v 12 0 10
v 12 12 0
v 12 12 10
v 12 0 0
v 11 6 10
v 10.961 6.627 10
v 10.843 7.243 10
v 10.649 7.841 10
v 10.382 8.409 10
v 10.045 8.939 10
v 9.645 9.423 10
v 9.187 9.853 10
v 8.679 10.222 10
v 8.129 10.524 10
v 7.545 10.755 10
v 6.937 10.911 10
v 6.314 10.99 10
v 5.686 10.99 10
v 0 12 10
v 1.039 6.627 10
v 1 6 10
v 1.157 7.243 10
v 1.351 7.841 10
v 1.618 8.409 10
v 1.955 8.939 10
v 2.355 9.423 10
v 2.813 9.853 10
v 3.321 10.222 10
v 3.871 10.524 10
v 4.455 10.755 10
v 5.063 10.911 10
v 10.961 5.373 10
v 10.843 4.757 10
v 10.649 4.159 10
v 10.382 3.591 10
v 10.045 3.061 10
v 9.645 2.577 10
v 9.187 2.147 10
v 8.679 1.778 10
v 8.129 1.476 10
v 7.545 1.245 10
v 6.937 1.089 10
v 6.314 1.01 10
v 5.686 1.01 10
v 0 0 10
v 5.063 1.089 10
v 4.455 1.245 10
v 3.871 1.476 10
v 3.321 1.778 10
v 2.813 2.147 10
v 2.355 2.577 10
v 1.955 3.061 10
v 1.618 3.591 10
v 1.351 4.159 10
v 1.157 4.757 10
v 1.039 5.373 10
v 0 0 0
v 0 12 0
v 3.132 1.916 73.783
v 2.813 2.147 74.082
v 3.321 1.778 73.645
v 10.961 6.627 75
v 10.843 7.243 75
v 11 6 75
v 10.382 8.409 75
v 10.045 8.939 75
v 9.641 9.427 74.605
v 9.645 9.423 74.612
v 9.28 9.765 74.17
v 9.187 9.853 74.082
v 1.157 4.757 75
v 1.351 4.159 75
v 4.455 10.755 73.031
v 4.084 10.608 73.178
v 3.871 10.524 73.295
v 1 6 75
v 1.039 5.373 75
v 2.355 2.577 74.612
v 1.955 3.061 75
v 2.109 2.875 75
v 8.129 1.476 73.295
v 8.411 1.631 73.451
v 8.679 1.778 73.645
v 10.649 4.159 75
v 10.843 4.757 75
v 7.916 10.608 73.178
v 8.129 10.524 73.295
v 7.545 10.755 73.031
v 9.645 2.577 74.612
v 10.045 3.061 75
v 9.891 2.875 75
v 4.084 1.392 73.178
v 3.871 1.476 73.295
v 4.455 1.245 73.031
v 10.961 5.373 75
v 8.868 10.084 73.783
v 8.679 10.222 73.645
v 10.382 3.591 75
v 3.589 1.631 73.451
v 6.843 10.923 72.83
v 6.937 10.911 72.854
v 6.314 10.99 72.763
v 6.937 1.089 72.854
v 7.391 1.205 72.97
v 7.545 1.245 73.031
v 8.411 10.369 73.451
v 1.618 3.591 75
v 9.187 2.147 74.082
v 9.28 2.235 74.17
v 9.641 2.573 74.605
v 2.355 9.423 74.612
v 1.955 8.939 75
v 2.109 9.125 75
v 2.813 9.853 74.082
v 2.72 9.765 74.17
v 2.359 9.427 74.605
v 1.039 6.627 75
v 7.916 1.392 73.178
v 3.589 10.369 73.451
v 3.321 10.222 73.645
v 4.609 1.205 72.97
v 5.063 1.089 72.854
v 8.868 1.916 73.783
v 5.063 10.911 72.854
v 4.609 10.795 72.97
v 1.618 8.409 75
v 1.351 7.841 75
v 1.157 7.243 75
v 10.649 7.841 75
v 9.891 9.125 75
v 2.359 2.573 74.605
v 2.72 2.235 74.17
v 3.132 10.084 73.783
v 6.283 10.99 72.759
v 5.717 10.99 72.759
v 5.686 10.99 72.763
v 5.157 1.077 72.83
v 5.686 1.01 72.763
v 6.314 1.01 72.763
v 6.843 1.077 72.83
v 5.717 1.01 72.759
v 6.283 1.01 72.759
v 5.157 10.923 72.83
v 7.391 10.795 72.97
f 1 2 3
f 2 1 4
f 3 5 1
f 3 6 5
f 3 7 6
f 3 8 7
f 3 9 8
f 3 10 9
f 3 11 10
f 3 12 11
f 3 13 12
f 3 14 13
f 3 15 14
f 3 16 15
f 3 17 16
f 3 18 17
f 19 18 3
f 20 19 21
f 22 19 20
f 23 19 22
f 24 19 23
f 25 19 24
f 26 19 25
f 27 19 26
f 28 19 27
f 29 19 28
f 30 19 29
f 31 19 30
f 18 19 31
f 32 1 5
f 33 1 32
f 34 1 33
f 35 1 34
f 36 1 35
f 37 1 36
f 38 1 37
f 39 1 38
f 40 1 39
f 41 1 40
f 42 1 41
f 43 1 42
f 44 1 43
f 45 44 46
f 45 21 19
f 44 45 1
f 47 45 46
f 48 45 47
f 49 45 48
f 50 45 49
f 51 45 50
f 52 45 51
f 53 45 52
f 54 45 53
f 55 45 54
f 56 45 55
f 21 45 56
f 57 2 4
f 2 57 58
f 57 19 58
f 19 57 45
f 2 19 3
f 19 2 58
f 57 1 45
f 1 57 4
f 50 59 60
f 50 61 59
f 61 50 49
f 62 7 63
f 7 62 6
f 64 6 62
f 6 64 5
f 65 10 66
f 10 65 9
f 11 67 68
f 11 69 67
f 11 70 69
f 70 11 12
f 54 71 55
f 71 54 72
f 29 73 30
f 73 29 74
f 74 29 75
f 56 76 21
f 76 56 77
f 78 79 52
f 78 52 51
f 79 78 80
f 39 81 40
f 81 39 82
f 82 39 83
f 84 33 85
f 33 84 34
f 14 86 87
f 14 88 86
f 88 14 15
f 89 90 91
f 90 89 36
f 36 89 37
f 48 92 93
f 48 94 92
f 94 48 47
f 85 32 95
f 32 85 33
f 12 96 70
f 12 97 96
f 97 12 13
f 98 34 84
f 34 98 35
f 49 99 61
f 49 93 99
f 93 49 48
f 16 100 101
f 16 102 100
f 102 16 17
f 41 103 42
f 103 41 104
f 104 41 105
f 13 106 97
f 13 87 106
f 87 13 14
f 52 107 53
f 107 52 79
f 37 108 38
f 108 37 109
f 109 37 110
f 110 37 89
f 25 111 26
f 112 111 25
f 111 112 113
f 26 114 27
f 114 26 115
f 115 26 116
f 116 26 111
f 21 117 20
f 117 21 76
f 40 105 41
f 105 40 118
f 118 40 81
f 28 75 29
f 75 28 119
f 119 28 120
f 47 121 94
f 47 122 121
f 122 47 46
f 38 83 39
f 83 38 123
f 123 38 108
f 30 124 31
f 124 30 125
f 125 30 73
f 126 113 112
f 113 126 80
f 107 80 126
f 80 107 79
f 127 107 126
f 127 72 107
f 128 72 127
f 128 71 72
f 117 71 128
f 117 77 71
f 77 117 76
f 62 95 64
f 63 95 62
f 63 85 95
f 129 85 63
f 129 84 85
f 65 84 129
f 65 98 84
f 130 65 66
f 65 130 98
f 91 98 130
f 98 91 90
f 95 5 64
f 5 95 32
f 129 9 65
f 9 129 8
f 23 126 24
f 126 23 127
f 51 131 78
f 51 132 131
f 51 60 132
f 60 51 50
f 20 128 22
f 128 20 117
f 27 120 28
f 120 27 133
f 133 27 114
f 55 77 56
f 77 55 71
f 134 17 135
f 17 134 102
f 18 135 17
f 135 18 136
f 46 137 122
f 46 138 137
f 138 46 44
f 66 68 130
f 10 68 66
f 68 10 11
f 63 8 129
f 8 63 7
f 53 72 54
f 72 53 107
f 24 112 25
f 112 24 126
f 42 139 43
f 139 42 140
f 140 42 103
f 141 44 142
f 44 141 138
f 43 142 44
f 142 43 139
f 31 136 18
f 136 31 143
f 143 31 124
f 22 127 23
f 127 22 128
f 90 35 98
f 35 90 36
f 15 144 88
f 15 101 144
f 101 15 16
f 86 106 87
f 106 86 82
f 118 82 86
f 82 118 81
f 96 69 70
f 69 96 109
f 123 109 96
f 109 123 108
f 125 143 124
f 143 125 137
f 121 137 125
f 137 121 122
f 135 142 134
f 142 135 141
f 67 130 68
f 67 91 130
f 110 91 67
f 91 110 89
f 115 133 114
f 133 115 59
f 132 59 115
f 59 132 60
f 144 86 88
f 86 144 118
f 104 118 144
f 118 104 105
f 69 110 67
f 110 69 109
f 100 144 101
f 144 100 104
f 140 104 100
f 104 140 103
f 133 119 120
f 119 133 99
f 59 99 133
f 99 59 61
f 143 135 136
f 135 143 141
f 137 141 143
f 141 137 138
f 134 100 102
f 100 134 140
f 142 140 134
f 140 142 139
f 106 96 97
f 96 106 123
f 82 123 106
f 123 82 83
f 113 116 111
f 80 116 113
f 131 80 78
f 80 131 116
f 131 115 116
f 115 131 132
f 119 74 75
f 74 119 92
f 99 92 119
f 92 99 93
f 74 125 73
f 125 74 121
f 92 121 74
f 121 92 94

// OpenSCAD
height = 75;
radius = 5;
rod_radius = 4.5;
base_width = 12;
base_height = 10;

$fn = 50;

difference() {
  union() {
    cube([base_width, base_width, base_height]);
    translate([base_width / 2, base_width / 2])
      cylinder(r=radius, h=height);
  }
  
  translate([base_width / 2, base_width, height + rod_radius / 2])
    rotate([90, 0, 0])
      cylinder(r=rod_radius, h=base_width);
}
